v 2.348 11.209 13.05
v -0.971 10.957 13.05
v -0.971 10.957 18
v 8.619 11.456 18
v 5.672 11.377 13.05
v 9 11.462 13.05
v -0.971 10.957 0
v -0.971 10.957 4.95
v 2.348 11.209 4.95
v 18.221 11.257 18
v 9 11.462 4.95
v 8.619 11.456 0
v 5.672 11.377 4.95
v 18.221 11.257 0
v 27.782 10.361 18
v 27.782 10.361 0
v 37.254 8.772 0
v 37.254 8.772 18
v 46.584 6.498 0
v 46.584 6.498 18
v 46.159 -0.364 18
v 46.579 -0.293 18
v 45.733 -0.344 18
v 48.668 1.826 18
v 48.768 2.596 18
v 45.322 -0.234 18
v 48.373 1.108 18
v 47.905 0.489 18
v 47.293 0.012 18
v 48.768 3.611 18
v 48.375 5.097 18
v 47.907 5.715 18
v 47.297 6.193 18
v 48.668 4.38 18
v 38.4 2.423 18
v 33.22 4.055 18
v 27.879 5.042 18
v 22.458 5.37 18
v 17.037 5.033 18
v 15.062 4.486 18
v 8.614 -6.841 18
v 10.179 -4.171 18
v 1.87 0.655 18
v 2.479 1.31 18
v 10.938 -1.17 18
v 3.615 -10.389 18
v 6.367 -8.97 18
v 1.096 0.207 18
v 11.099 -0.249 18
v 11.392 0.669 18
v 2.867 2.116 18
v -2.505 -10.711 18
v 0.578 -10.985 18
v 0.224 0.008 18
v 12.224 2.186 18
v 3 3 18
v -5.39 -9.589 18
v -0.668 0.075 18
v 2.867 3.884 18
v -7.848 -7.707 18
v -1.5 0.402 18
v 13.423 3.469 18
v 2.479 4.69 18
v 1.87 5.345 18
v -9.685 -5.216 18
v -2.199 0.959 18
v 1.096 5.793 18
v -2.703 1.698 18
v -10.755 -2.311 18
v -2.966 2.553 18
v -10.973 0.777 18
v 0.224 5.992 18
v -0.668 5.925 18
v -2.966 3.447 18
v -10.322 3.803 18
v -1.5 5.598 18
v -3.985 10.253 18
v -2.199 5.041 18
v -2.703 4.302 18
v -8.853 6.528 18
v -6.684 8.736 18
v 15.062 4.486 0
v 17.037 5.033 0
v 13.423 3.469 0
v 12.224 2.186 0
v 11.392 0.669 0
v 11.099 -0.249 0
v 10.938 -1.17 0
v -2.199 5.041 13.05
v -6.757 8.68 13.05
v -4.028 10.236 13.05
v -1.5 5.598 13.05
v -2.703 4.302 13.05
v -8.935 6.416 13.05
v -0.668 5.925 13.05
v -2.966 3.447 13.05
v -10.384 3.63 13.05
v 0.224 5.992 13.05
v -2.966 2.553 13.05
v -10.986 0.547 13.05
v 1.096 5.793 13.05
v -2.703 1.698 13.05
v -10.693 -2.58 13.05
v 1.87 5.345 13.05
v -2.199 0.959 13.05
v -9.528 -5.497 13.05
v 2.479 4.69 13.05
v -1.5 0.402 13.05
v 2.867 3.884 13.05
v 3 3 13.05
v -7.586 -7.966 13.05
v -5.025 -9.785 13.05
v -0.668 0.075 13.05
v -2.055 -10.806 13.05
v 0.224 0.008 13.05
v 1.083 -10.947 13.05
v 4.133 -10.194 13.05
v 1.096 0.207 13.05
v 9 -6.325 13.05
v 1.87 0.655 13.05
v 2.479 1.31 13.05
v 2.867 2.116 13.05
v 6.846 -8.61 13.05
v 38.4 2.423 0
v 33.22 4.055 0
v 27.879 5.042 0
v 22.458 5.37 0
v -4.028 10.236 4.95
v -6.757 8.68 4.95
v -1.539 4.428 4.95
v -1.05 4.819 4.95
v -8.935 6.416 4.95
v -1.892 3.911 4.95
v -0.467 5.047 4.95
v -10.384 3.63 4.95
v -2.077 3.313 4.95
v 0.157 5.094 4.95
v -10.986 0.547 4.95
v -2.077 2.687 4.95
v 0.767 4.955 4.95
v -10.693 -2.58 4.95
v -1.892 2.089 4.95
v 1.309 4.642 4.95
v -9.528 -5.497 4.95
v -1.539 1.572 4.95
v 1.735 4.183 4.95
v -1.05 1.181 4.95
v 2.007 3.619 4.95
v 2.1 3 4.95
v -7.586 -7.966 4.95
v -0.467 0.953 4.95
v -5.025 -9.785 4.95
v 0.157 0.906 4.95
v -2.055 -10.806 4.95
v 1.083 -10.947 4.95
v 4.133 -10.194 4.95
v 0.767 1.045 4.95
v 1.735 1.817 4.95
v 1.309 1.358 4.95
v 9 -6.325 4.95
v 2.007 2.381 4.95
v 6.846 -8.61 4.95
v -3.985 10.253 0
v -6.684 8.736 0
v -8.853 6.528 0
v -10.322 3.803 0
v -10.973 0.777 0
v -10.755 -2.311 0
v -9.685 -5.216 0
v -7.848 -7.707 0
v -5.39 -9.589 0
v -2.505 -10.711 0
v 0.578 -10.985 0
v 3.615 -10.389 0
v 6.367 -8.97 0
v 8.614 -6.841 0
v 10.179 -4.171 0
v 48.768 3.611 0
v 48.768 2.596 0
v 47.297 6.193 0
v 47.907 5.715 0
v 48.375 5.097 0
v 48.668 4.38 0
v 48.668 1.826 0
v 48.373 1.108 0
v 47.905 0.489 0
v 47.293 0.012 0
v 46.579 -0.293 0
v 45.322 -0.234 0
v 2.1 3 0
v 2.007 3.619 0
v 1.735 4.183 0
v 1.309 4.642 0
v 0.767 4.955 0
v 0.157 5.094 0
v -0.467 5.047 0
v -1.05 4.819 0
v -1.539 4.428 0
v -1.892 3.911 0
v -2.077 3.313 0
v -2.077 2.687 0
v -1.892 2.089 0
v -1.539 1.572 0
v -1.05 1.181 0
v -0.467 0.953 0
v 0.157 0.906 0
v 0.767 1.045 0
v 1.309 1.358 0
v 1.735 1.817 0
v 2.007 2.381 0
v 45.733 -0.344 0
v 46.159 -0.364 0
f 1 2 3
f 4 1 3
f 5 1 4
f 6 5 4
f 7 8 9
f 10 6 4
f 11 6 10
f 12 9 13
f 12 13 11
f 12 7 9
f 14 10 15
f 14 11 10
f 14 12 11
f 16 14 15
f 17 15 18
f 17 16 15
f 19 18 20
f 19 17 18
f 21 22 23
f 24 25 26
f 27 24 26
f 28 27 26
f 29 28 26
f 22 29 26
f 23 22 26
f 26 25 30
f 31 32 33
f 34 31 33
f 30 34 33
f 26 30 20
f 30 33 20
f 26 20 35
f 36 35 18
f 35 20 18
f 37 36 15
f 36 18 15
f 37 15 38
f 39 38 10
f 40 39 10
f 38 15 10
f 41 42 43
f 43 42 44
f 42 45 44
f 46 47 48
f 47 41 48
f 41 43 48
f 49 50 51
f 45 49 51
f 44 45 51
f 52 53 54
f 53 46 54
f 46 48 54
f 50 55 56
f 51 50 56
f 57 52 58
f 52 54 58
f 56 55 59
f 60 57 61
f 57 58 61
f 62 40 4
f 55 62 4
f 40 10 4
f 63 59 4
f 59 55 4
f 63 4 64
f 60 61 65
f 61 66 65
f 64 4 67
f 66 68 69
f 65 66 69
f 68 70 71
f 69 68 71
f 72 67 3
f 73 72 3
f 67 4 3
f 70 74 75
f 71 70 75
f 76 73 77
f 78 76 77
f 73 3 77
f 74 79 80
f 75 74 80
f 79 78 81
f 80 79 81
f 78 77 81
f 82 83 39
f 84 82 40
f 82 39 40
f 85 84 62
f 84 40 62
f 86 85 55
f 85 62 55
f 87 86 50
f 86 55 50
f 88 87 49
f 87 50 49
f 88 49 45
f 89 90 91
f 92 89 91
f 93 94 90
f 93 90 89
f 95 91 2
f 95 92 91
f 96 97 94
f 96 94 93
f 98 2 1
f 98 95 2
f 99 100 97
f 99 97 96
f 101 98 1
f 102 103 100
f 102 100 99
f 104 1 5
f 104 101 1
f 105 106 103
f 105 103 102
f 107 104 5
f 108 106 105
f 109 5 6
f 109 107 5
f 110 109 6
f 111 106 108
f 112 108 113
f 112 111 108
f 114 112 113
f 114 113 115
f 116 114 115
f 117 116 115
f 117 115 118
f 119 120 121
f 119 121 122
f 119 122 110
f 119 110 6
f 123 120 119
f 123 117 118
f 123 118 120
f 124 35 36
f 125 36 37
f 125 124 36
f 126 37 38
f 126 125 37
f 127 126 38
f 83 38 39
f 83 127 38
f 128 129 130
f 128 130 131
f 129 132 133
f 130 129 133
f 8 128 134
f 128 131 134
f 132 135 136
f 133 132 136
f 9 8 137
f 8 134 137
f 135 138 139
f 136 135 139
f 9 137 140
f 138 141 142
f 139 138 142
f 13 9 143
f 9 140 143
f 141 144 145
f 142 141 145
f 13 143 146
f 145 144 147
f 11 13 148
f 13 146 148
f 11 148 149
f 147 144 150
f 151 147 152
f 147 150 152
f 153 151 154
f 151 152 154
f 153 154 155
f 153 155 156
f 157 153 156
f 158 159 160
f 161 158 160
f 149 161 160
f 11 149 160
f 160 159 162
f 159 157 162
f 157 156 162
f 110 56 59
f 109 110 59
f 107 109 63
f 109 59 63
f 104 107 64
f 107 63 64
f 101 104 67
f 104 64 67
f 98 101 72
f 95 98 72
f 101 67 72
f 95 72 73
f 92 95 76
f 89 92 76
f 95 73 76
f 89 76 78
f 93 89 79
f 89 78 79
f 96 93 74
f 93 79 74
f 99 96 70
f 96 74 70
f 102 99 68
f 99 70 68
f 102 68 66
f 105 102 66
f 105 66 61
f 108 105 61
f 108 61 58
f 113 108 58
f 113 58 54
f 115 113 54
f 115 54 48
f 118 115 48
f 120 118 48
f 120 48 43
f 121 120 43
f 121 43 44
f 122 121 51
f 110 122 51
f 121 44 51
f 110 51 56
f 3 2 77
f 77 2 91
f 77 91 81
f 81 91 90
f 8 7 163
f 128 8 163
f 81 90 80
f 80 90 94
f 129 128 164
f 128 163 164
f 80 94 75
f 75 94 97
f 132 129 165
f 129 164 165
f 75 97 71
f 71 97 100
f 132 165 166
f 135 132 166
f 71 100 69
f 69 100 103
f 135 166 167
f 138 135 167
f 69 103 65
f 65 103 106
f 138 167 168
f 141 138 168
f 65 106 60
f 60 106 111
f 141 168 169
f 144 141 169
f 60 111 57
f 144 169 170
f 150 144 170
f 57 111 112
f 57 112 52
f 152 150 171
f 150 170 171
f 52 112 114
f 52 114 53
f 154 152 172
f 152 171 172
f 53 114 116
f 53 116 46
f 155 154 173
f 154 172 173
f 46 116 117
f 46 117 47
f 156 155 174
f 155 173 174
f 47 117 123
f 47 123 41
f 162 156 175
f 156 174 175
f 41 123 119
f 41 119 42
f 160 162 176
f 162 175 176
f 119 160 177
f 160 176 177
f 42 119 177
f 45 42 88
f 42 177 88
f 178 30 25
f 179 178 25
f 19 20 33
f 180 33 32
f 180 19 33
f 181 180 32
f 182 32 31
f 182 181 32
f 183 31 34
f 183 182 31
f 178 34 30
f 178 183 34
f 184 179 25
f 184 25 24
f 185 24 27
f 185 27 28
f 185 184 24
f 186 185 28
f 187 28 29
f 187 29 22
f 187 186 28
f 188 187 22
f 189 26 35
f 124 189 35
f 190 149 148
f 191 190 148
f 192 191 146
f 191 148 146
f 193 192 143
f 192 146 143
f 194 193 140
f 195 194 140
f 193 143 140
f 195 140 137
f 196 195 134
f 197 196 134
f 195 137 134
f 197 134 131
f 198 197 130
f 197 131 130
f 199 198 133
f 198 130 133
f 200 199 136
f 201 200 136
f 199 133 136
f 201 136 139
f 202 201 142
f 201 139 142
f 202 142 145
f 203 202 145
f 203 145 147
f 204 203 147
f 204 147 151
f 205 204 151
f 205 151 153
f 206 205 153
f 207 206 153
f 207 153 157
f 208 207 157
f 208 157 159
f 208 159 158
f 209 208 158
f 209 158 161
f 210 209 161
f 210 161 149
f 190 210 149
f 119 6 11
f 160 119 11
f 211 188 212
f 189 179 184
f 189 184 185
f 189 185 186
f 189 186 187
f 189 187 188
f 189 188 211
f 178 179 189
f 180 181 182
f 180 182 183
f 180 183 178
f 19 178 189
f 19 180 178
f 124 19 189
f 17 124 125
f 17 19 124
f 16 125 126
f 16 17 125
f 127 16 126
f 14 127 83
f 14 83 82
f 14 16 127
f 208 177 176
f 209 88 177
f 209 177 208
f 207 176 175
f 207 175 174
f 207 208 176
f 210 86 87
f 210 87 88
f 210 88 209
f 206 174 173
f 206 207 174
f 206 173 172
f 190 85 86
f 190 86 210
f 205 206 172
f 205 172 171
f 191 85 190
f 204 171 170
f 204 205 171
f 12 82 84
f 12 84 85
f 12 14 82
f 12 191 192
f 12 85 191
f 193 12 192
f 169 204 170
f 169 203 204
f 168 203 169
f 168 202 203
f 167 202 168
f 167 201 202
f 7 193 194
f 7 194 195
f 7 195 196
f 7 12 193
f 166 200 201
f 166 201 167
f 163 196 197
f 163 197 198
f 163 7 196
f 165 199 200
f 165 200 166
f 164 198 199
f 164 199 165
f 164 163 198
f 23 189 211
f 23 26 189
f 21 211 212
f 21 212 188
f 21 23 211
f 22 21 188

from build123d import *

# Parameters (mm, degrees)
SKETCH_1_R               = 11
EXTRUDE_1_DEPTH          = 18
EXTRUDE_2_DEPTH          = 18
FILLET_1_R               = 2
CUT_EXTRUDE_1_DEPTH      = 54.23509778
CUT_EXTRUDE_1_DEPTH_BACK = 54.23509778
SKETCH_3_W               = 20
SKETCH_3_H               = 8.1
SKETCH_4_R               = 3
CUT_EXTRUDE_2_DEPTH      = 4.95
SKETCH_5_R               = 2.1
CUT_EXTRUDE_3_DEPTH      = 54.23509778
FILLET_2_R               = 7


with BuildPart() as part:
    # Эскиз1 → Бобышка-Вытянуть1 (new body)
    with BuildSketch(Plane.XY):
        Circle(SKETCH_1_R)
    extrude(amount=EXTRUDE_1_DEPTH)

    # Эскиз2 → Бобышка-Вытянуть2 (add)
    with BuildSketch(Plane.XY):
        with BuildLine():
            Line((48.76838274, 3.610991898), (48.76838274, 2.595691289))
            ThreePointArc((48.76838274, 2.595691289), (47.88840056, 0.473069222), (45.76469978, -0.40430645))
            Line((45.76469978, -0.40430645), (38.399722319, 2.422654444))
            ThreePointArc((38.399722319, 2.422654444), (24.484941772, 5.325401982), (10.366167345, 3.680023719))
            Line((10.366167345, 3.680023719), (-0.971178616, 10.957043949))
            ThreePointArc((-0.971178616, 10.957043949), (23.009820936, 10.8960239), (46.584150264, 6.497949353))
            ThreePointArc((46.584150264, 6.497949353), (48.160798106, 5.421060602), (48.76838274, 3.610991898))
        make_face()
    extrude(amount=EXTRUDE_2_DEPTH)

    # Скругление1
    fillet_1_edges = [part.edges().sort_by_distance(p)[0] for p in [
        (45.76469978, -0.40430645, 9),
    ]]
    fillet(fillet_1_edges, radius=FILLET_1_R)

    # Эскиз3 → Вырез-Вытянуть1 (cut, two sides: drawn at the far end of the back side and taken through both)
    with BuildSketch(Plane(origin=(0, 0, 0), x_dir=(1, 0, 0), z_dir=(0, 1, 0)).offset(-CUT_EXTRUDE_1_DEPTH_BACK)):
        with Locations((-1, -9)):
            Rectangle(SKETCH_3_W, SKETCH_3_H)
    extrude(amount=CUT_EXTRUDE_1_DEPTH + CUT_EXTRUDE_1_DEPTH_BACK, mode=Mode.SUBTRACT)

    # Эскиз4 → Вырез-Вытянуть2 (cut)
    with BuildSketch(Plane.XY.offset(18)):
        with Locations((0, 3)):
            Circle(SKETCH_4_R)
    extrude(amount=-CUT_EXTRUDE_2_DEPTH, mode=Mode.SUBTRACT)

    # Эскиз5 → Вырез-Вытянуть3 (cut, through all)
    with BuildSketch(Plane.XY.offset(18)):
        with Locations((0, 3)):
            Circle(SKETCH_5_R)
    extrude(amount=-CUT_EXTRUDE_3_DEPTH, mode=Mode.SUBTRACT)

    # Скругление2
    fillet_2_edges = [part.edges().sort_by_distance(p)[0] for p in [
        (10.366167345, 3.680023719, 9),
    ]]
    fillet(fillet_2_edges, radius=FILLET_2_R)


solid = part.part
